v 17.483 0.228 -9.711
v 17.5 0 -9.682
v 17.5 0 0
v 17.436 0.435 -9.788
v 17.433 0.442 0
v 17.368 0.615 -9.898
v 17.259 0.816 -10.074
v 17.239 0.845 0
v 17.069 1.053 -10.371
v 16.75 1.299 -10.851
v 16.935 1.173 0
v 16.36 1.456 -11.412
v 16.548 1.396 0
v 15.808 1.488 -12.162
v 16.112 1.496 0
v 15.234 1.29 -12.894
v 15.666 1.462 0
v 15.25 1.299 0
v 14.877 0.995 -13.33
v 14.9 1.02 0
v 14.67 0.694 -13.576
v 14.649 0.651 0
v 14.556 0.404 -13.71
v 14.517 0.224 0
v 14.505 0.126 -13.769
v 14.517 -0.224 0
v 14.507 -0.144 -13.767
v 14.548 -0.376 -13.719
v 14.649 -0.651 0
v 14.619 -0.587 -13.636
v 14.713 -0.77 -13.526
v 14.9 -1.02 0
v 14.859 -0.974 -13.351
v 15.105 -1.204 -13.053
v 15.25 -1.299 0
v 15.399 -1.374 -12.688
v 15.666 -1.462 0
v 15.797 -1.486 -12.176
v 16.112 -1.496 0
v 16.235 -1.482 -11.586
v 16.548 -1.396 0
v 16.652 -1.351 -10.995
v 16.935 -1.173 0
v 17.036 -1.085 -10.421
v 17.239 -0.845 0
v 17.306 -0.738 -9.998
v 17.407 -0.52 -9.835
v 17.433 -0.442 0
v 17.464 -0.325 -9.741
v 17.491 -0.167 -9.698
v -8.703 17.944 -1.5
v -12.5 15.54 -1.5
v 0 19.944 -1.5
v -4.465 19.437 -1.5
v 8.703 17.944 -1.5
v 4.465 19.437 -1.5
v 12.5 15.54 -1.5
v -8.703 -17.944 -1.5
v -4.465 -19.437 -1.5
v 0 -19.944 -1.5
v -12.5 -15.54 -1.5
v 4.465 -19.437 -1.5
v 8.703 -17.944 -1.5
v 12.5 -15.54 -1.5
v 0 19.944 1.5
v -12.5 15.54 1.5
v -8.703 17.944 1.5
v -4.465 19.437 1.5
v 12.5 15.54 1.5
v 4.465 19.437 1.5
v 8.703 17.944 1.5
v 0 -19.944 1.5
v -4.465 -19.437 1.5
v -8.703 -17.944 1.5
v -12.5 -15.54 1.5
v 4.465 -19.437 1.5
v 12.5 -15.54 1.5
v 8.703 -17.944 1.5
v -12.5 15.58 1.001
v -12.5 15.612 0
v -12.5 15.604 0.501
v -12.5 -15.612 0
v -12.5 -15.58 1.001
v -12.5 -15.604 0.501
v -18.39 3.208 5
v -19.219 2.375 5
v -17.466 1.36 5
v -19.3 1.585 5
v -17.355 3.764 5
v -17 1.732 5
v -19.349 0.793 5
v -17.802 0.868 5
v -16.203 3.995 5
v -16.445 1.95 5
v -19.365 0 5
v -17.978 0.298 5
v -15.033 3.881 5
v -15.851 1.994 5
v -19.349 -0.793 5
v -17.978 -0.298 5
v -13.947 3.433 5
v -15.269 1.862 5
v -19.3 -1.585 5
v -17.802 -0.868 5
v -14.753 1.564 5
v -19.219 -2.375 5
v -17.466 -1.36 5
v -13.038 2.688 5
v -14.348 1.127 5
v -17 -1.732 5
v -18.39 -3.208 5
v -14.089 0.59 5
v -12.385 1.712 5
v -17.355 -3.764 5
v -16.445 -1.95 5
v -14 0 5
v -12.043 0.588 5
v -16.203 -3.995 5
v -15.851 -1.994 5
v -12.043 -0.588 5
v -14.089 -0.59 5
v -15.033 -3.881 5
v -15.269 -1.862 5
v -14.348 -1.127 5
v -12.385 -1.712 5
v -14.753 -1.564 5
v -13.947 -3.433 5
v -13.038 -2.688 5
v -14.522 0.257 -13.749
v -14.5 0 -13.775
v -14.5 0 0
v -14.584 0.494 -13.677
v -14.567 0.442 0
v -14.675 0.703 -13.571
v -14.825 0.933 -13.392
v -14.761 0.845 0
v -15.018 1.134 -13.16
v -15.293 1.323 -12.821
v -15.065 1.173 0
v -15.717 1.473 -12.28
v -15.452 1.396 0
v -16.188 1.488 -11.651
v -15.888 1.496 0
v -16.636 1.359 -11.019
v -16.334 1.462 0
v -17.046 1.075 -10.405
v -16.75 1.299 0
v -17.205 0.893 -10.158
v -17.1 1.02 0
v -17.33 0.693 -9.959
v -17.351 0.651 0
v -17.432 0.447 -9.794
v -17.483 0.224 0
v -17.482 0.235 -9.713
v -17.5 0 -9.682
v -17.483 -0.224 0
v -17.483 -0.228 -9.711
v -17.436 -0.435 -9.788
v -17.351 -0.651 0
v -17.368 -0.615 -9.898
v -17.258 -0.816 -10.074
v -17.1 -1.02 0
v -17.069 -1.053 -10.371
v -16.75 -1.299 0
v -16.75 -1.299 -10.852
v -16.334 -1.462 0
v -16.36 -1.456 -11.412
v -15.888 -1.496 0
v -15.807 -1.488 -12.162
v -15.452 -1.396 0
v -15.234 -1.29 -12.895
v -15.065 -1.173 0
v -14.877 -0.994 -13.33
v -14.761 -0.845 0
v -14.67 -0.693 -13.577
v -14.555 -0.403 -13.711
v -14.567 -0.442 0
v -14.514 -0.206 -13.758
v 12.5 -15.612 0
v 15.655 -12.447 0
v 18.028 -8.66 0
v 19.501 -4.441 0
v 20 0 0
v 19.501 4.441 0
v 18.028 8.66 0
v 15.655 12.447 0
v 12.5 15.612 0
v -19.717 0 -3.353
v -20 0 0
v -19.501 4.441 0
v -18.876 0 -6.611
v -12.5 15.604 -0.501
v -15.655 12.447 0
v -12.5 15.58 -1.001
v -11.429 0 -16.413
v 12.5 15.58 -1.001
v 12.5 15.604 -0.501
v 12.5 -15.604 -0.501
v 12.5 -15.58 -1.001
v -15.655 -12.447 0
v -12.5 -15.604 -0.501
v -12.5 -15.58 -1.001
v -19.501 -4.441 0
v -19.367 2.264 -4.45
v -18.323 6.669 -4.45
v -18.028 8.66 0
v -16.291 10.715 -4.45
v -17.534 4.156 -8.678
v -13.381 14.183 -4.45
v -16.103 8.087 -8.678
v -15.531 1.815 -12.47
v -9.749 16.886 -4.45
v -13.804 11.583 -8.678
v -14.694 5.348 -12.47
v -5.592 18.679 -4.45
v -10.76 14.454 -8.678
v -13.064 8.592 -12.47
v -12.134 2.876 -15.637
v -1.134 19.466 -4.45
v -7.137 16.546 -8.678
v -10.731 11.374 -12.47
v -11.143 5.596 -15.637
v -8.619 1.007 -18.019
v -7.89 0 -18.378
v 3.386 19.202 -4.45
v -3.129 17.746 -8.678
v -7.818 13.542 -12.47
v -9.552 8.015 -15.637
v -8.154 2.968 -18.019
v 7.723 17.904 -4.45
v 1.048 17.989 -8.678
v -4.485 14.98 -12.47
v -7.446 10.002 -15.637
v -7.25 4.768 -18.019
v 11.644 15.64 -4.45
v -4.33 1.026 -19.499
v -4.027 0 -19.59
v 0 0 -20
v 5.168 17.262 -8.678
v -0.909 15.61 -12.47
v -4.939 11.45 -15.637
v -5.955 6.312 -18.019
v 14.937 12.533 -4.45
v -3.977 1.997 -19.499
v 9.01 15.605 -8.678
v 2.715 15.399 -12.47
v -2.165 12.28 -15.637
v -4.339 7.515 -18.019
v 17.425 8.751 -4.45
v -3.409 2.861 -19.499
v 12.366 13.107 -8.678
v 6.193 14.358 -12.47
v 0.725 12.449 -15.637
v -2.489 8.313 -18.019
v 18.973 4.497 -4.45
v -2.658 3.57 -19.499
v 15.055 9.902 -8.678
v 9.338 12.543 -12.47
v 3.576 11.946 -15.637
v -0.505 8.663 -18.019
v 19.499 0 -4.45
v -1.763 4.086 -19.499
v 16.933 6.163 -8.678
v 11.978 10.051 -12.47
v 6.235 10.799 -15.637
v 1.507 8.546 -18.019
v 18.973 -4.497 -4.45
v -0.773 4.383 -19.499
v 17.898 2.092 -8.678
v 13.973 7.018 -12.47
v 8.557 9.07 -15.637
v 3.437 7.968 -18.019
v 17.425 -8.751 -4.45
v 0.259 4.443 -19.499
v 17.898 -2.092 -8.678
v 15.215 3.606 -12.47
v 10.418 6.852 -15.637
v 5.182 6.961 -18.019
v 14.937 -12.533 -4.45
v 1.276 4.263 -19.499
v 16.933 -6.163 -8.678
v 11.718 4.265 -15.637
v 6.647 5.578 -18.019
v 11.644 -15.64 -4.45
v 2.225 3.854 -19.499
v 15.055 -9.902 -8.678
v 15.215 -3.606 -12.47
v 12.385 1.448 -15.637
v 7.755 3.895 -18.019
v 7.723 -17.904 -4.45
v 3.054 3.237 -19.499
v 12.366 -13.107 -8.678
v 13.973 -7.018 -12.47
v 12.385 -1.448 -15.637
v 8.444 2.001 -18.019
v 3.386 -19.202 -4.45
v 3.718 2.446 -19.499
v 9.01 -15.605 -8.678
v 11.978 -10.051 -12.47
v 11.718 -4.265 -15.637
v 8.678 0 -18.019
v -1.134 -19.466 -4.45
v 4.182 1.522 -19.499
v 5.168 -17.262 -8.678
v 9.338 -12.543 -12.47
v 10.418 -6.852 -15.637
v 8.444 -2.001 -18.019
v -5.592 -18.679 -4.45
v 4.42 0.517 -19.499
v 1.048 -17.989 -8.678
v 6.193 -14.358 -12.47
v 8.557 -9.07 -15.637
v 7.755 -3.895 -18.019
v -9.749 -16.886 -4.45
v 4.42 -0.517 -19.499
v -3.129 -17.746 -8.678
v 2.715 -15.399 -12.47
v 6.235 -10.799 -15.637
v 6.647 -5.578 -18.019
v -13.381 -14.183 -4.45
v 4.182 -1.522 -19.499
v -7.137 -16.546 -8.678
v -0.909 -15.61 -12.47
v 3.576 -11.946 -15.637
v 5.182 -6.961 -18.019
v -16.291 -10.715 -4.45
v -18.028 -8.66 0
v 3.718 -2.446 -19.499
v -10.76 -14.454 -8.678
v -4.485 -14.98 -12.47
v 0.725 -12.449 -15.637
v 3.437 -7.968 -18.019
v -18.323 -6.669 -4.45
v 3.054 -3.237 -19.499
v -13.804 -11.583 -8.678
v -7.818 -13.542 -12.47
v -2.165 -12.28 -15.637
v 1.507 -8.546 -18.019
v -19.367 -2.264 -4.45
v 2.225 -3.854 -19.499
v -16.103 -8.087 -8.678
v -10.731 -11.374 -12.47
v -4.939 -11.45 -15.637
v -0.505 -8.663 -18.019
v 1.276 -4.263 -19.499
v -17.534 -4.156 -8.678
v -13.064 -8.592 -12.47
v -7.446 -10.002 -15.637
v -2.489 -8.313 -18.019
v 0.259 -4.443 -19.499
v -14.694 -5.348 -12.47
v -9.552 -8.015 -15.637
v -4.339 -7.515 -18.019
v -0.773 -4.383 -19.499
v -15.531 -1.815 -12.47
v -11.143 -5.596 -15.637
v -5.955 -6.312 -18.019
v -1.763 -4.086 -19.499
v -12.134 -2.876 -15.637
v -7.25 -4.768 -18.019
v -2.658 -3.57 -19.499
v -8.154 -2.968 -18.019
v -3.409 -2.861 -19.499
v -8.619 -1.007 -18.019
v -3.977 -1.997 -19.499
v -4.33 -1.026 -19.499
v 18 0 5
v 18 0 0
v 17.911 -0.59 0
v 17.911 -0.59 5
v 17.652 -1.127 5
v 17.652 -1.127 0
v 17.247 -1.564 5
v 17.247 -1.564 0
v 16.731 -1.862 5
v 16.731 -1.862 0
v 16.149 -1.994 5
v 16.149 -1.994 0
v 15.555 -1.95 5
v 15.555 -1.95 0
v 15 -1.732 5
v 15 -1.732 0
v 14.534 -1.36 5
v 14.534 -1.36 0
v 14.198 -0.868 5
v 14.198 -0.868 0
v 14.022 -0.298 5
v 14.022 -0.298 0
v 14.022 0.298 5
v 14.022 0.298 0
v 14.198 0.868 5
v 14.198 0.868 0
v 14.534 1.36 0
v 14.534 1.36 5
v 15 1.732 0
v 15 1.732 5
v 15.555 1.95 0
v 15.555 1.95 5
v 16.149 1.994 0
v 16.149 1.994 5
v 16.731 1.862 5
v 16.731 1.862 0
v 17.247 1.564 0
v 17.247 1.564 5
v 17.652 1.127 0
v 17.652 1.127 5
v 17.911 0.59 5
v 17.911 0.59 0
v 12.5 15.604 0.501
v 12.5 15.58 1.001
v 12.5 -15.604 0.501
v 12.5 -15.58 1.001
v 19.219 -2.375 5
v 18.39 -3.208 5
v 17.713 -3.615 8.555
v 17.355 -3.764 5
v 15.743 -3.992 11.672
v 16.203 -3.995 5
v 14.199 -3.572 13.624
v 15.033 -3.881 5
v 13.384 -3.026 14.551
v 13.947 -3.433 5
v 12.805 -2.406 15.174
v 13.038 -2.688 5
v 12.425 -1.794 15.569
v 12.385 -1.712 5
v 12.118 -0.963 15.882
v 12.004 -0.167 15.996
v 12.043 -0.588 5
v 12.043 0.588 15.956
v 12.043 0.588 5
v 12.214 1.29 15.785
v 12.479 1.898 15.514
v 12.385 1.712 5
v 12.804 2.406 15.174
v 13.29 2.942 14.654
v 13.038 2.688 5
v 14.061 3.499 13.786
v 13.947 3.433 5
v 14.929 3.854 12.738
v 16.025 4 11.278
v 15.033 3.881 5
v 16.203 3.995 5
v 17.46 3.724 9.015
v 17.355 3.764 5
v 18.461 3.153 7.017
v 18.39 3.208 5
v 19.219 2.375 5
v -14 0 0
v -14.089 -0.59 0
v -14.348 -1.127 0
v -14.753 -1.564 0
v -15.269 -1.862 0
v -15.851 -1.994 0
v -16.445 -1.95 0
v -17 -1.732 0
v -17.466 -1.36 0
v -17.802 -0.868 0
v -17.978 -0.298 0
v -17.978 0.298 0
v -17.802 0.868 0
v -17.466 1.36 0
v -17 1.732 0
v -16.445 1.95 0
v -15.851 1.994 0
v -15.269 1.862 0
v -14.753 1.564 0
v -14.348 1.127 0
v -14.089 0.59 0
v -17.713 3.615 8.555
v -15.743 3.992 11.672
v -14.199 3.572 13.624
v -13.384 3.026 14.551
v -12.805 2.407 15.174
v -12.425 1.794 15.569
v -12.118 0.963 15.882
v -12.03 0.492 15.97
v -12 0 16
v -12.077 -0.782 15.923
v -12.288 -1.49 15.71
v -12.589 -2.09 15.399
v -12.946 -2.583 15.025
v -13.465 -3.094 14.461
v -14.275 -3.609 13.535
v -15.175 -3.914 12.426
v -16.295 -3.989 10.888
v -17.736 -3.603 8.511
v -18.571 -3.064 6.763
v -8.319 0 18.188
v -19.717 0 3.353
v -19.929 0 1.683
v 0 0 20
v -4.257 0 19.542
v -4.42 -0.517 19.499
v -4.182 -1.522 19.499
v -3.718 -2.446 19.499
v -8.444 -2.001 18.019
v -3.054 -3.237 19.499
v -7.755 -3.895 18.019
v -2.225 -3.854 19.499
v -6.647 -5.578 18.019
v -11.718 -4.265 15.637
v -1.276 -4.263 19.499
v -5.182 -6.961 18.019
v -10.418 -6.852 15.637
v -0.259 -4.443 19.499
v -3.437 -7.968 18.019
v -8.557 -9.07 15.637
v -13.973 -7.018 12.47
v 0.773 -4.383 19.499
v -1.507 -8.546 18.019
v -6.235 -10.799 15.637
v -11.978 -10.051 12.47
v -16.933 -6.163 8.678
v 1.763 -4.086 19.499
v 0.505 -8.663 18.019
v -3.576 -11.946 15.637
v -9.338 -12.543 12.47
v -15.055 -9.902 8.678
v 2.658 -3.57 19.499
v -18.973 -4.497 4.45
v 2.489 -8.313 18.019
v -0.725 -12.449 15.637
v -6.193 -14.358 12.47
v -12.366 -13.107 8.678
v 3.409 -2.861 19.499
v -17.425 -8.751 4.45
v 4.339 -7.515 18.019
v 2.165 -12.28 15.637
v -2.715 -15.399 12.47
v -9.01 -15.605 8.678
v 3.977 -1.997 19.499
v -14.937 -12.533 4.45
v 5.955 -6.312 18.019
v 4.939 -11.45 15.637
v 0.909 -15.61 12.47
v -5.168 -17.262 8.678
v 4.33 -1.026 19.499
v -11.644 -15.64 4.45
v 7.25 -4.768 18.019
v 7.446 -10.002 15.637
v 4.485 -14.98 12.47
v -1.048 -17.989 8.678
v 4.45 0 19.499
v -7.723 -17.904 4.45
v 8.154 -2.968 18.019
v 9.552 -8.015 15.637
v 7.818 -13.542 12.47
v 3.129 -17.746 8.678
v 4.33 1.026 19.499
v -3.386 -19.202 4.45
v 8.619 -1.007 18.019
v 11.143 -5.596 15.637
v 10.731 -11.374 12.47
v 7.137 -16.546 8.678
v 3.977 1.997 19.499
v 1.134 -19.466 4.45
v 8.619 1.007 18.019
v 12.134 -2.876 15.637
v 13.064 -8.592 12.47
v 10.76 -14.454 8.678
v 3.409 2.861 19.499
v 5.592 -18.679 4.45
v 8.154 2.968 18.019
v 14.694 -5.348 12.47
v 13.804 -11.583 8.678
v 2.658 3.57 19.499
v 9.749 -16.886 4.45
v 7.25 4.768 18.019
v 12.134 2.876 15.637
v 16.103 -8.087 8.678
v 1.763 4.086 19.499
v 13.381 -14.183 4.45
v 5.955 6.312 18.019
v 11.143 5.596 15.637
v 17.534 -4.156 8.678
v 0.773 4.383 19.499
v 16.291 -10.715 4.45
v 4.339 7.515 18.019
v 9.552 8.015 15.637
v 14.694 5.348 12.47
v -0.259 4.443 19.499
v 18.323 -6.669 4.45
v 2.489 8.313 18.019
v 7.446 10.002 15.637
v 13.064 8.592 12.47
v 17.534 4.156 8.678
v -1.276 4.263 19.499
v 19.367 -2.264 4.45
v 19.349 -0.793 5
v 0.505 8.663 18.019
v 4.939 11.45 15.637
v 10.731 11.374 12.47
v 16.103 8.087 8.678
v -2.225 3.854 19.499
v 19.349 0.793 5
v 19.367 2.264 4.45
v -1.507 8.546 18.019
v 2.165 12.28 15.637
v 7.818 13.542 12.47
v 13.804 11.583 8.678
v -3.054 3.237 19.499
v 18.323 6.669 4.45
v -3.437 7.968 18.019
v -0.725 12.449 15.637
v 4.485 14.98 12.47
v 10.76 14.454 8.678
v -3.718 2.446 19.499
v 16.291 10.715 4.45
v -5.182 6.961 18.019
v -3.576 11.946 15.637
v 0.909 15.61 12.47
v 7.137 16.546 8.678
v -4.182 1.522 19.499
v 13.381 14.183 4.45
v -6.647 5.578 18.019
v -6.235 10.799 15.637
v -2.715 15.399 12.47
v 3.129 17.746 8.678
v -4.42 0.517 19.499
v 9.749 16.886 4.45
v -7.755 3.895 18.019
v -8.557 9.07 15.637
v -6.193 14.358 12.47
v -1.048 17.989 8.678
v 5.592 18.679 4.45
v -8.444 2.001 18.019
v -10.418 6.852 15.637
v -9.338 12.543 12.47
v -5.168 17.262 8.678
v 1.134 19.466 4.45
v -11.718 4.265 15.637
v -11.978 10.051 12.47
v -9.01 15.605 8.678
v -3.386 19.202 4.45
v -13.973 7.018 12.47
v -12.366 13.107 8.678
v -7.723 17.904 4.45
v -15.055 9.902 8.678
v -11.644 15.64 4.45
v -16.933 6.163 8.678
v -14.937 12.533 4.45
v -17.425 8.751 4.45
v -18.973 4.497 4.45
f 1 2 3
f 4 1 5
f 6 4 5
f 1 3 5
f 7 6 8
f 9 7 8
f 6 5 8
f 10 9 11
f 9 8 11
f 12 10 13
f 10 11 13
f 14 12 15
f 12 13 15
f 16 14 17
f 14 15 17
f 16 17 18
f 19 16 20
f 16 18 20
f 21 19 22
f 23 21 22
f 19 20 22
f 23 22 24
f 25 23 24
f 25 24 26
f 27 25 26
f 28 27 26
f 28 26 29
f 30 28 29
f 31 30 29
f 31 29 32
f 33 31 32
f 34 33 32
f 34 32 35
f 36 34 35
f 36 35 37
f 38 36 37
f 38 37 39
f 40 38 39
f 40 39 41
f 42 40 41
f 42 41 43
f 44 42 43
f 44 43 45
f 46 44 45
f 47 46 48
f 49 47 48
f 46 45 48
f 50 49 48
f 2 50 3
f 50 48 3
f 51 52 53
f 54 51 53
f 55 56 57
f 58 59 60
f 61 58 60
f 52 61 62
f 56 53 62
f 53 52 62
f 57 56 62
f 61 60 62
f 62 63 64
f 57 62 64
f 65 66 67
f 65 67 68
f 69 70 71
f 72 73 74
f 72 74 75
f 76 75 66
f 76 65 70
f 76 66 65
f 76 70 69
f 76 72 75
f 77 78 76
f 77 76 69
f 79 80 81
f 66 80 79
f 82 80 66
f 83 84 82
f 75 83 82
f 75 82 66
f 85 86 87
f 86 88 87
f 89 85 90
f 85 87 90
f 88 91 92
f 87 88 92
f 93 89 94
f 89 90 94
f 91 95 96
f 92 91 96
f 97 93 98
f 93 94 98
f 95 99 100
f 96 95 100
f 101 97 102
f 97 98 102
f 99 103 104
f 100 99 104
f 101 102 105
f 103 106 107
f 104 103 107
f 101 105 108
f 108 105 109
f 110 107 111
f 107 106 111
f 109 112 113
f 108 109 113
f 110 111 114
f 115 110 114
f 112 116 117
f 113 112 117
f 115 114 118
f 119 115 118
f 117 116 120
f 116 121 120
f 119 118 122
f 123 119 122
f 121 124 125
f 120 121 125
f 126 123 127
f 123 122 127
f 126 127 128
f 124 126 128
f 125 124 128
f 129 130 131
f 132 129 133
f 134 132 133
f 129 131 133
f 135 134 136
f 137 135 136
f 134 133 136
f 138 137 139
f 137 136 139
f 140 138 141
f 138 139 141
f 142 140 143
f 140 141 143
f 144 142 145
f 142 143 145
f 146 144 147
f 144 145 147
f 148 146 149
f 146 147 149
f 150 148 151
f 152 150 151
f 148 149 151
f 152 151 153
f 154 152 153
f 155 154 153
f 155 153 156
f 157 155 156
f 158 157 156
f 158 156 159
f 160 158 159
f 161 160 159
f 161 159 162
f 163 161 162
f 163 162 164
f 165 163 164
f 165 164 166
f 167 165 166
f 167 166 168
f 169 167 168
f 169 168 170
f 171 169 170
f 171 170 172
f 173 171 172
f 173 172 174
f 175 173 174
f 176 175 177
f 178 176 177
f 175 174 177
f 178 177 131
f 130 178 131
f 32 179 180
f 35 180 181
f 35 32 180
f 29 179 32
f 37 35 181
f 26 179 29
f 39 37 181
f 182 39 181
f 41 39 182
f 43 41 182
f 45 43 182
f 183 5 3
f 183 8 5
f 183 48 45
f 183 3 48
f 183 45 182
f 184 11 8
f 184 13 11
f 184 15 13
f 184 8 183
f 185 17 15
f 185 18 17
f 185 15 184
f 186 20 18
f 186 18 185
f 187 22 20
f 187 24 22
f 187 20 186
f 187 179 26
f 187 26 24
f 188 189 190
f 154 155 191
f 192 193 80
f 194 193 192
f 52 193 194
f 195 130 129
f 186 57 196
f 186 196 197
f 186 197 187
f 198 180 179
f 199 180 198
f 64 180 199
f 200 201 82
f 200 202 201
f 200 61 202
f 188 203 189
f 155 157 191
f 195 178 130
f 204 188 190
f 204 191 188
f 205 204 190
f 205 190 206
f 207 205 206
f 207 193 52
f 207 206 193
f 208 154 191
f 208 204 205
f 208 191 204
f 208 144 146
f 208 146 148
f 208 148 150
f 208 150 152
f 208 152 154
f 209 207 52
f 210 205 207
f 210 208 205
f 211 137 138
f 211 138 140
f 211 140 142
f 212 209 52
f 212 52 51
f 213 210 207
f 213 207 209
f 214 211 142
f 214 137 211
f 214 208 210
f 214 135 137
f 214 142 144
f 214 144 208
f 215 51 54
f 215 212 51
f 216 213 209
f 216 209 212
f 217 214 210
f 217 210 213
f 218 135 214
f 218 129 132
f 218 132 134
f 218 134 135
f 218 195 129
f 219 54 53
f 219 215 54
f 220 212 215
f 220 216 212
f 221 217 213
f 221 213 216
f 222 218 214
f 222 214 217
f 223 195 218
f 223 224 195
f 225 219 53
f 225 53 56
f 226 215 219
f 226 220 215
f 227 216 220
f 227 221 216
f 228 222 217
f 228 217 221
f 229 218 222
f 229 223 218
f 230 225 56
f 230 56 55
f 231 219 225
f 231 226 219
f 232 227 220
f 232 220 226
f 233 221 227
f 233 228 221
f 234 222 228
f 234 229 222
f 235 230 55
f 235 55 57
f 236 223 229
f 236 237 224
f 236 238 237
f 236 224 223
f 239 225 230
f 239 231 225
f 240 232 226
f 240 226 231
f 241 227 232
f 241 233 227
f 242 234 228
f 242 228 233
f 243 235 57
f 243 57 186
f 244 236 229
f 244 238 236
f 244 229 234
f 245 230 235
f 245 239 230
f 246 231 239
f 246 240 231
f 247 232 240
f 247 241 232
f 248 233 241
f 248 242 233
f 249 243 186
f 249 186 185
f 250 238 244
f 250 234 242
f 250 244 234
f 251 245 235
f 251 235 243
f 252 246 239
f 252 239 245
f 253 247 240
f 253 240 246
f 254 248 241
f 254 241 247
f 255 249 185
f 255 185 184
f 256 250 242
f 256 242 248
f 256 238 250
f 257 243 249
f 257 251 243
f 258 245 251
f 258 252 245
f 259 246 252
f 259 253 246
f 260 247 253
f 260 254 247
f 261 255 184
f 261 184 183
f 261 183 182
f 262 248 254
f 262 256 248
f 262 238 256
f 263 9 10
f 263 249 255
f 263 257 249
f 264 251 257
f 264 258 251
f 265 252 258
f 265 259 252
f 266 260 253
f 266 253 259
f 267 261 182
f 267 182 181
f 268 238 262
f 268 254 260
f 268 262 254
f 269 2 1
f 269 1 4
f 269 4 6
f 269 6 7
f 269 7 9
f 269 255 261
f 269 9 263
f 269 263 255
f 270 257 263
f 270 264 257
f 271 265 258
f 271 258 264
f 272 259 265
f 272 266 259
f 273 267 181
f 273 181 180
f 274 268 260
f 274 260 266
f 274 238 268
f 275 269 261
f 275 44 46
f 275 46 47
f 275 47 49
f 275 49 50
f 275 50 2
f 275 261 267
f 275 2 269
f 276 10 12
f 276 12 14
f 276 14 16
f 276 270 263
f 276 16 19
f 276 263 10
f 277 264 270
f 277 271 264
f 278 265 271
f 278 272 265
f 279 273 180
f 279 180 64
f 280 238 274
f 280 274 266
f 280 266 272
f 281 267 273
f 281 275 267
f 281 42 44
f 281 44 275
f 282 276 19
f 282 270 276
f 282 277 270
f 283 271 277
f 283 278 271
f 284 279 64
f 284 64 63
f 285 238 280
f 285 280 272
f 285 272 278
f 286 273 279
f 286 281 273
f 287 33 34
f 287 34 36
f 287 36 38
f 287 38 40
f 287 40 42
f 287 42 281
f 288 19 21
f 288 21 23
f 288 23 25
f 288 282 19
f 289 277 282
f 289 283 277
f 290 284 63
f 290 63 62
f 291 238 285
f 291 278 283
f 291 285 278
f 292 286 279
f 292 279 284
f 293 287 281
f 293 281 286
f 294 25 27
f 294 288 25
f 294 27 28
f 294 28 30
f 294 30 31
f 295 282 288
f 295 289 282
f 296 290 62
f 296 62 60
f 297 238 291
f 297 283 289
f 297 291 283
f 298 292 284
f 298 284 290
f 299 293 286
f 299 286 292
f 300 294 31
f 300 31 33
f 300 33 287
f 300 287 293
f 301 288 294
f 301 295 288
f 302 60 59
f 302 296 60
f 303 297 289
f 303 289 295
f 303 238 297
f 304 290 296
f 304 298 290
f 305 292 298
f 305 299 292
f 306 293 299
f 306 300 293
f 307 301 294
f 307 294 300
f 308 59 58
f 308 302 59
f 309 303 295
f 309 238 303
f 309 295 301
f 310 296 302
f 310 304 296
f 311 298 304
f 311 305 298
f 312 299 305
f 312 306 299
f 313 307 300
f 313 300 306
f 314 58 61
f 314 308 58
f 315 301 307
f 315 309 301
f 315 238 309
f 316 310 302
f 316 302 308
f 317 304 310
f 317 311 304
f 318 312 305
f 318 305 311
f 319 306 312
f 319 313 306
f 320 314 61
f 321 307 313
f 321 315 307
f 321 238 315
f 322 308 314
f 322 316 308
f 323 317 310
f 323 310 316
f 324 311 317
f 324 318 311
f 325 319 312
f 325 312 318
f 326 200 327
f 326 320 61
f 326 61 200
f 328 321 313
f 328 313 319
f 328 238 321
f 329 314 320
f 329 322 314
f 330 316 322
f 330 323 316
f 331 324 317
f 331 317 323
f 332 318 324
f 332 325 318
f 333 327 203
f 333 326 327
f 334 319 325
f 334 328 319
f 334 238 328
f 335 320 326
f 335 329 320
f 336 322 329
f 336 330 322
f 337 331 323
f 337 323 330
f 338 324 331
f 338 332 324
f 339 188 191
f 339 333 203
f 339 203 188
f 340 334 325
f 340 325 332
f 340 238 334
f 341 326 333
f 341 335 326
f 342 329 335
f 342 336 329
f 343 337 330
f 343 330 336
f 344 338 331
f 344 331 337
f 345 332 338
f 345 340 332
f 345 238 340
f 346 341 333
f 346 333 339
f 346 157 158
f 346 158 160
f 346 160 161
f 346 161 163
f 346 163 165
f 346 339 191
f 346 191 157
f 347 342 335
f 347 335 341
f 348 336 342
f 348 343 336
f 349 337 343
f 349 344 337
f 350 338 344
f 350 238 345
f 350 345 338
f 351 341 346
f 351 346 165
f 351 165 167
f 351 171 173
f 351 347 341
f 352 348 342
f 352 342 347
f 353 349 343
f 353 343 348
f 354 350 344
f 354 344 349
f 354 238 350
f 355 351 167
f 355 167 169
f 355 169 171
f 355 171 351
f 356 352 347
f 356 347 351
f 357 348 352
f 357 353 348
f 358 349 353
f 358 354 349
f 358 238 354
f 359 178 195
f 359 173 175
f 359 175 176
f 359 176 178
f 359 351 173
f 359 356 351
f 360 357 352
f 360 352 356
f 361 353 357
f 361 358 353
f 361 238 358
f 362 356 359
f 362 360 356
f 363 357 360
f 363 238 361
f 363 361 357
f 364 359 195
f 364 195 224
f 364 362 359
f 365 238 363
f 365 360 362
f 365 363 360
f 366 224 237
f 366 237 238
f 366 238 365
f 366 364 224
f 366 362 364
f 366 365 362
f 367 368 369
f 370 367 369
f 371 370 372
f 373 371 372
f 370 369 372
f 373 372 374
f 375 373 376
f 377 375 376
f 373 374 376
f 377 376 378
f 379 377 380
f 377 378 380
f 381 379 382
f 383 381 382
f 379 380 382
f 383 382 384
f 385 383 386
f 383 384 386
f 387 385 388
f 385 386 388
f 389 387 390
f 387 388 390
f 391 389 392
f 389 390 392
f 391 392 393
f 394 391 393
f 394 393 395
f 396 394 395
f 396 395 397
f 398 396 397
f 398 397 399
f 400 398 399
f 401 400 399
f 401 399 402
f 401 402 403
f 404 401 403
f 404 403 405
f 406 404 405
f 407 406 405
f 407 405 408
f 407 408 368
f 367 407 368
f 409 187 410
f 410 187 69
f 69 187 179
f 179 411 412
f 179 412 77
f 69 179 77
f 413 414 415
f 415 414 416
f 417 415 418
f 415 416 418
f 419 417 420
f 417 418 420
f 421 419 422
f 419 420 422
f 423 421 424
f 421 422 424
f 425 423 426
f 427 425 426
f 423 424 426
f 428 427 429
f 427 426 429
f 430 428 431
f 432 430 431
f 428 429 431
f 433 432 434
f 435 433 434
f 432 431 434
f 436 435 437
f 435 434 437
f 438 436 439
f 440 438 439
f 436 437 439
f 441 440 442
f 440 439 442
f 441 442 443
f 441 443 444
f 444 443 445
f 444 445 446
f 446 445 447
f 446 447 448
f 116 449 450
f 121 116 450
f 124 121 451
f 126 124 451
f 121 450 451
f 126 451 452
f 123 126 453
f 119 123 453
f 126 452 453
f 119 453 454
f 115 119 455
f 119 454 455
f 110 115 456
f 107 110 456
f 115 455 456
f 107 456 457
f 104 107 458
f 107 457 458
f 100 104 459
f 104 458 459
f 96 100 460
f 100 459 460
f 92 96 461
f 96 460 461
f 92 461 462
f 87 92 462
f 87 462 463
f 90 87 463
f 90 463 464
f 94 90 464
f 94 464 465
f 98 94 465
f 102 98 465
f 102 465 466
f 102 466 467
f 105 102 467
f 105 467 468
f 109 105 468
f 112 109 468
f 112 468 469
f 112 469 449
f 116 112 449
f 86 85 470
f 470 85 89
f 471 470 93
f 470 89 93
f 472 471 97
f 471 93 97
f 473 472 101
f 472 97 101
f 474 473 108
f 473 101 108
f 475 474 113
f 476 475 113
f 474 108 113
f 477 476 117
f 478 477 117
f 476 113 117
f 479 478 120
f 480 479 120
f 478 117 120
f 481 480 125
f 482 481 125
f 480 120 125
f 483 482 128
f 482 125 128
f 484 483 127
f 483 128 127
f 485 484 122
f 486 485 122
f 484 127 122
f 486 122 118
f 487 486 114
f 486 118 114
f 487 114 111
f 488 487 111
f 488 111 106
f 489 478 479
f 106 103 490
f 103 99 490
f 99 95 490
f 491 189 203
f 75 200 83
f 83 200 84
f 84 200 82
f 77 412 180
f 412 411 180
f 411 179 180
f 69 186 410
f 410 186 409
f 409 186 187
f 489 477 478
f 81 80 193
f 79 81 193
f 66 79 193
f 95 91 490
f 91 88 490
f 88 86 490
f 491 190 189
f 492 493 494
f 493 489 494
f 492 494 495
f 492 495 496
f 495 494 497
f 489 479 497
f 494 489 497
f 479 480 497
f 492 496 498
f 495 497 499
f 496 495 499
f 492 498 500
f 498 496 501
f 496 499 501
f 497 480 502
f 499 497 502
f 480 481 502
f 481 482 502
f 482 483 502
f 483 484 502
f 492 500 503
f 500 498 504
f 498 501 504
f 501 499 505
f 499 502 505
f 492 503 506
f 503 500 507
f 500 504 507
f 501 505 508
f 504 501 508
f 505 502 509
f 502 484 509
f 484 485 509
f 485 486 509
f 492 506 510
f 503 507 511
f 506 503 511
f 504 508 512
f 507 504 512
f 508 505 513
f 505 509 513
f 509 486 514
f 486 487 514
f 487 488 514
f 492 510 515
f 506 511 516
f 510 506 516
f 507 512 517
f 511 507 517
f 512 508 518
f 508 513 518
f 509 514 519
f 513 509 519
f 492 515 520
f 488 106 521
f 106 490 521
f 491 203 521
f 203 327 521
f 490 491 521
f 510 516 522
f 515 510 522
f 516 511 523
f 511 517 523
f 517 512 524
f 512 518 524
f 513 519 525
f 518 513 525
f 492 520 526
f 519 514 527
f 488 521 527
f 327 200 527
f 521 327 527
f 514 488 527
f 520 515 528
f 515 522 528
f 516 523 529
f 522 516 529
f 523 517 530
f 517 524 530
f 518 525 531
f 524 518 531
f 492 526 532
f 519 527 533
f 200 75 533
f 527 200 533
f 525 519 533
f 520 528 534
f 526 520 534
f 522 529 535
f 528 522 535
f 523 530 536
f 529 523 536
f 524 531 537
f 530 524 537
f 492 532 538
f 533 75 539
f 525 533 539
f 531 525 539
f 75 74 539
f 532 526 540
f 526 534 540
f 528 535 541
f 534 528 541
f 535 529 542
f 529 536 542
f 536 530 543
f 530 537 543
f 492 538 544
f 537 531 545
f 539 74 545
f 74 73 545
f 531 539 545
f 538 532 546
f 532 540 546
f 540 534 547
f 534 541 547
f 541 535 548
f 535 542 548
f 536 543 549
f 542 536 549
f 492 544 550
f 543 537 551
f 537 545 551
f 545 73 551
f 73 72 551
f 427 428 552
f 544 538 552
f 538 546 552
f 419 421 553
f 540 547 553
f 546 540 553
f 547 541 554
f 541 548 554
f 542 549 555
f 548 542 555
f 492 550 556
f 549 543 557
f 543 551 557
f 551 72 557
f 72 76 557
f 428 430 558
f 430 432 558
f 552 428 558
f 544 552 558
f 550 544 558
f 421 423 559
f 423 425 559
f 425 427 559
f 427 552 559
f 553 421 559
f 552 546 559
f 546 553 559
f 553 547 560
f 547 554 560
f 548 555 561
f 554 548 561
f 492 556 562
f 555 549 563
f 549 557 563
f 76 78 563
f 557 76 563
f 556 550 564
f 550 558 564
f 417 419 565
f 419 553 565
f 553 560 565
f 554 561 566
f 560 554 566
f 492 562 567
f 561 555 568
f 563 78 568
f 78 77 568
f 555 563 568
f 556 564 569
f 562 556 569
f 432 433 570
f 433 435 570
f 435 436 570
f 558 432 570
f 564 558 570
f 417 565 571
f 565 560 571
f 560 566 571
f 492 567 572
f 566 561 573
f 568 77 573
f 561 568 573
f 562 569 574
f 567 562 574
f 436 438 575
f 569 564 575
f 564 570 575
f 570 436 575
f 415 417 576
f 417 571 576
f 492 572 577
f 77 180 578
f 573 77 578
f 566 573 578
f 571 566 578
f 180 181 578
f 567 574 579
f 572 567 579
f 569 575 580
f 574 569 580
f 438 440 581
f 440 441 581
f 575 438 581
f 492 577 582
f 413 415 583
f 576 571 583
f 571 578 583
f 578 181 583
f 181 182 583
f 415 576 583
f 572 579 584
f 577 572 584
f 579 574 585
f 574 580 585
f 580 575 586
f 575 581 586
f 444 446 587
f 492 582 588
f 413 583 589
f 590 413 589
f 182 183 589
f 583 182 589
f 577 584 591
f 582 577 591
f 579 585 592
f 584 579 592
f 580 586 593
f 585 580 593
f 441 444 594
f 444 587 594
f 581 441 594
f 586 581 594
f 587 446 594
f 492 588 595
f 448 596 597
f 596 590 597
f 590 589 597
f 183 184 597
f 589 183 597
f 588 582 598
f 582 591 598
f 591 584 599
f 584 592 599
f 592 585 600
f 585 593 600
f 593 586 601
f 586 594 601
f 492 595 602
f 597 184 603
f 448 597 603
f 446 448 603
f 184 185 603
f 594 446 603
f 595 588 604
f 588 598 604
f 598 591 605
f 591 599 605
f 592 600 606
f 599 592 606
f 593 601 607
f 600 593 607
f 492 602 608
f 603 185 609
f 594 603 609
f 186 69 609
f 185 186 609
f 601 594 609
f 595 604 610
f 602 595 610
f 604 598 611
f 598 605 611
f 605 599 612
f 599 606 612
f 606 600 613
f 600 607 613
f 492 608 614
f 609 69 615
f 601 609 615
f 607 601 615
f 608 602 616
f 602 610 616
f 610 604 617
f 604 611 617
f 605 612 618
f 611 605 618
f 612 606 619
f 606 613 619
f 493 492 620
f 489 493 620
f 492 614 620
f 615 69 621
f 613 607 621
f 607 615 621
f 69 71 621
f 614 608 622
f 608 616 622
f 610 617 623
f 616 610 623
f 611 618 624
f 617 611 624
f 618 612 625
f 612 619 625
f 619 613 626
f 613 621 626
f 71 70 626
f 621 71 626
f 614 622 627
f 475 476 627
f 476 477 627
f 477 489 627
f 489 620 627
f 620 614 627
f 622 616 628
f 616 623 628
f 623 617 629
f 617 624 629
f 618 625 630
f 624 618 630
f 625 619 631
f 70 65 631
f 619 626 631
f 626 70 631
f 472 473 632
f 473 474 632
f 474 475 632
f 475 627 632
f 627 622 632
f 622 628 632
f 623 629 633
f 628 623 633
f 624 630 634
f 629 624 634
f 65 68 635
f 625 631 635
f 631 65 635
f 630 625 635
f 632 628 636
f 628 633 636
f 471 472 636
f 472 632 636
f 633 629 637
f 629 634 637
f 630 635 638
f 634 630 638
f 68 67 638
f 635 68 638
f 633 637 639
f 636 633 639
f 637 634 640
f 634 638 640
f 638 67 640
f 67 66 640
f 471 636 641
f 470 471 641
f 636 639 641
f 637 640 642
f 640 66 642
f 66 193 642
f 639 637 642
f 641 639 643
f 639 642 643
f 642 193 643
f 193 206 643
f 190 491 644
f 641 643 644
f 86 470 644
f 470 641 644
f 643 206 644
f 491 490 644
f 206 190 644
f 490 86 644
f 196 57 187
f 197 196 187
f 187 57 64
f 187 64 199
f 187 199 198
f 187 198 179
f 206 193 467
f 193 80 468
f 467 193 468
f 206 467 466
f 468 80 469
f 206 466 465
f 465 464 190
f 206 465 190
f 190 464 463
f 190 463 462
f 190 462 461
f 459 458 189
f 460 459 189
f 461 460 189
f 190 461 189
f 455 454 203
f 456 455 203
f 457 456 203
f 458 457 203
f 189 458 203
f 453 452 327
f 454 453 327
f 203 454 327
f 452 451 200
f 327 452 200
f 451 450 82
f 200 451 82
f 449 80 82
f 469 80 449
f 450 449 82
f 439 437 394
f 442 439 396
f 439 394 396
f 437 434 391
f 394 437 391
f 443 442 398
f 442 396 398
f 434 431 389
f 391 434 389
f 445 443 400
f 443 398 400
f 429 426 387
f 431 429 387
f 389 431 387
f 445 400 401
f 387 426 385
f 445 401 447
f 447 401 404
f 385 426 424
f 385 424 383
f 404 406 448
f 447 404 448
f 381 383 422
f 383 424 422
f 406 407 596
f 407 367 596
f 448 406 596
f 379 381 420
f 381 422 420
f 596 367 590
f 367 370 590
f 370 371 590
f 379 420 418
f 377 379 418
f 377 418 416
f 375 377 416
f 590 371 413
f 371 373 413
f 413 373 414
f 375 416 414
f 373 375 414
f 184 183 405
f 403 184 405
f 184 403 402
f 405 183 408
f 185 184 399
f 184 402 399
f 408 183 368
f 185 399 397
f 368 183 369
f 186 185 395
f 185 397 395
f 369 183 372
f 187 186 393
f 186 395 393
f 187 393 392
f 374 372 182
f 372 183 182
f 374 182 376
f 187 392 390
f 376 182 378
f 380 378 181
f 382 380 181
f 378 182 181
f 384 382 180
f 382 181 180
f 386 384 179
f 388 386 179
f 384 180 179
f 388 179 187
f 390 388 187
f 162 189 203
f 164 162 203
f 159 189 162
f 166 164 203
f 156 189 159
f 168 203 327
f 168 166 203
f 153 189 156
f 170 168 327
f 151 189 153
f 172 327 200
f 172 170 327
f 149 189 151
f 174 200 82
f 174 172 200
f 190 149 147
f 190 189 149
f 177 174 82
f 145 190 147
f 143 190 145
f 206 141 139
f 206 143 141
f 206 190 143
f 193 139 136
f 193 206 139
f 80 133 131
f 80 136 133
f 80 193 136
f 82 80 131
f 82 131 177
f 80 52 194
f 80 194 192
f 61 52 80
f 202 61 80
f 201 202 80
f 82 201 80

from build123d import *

# Parameters (mm, degrees)
F2_W      = 25
F2_H      = 3
F3_DEPTH  = 25
F4_R      = 2
F5_DEPTH  = 20.001
F7_R      = 4
F8_DEPTH  = 15.001
F11_W     = 25
F11_H     = 3
F12_DEPTH = 25
F13_R     = 1.5
F14_DEPTH = 20.001


with BuildPart() as f1:
    # F0 (on Front) → F1 (revolve)
    with BuildSketch(Plane.XZ):
        with BuildLine():
            Line((0, 0), (0, 20))
            ThreePointArc((0, 20), (-14.1421356237, 14.1421356237), (-20, 0))
            Line((-20, 0), (0, 0))
        make_face()
    revolve(axis=Axis((0, 0, 10), (0, 0, 1)))

    # F2 (on Front) → F3 (cut, symmetric)
    with BuildSketch(Plane.XZ):
        Rectangle(F2_W, F2_H)
    extrude(amount=F3_DEPTH, both=True, mode=Mode.SUBTRACT)

    # F4 (on face) → F5 (cut, through all)
    with BuildSketch(Plane(origin=(0, 0, 0), x_dir=(1, 0, 0), z_dir=(0, 0, -1))):
        with Locations((-16, 0)):
            Circle(F4_R)
        with Locations((16, 0)):
            Circle(F4_R)
    extrude(amount=-F5_DEPTH, mode=Mode.SUBTRACT)

    # F7 (on offset) → F8 (cut, through all)
    with BuildSketch(Plane(origin=(0, 0, 5), x_dir=(1, 0, 0), z_dir=(0, 0, -1))):
        with Locations((-16, 0)):
            Circle(F7_R)
        with Locations((16, 0)):
            Circle(F7_R)
    extrude(amount=-F8_DEPTH, mode=Mode.SUBTRACT)


with BuildPart() as f10:
    # F9 (on Front) → F10 (revolve)
    with BuildSketch(Plane.XZ):
        with BuildLine():
            Line((0, 0), (-20, 0))
            ThreePointArc((-20, 0), (-14.1421356237, -14.1421356237), (0, -20))
            Line((0, -20), (0, 0))
        make_face()
    revolve(axis=Axis((0, 0, -10), (0, 0, -1)))

    # F11 (on Front) → F12 (cut, symmetric)
    with BuildSketch(Plane.XZ):
        Rectangle(F11_W, F11_H)
    extrude(amount=F12_DEPTH, both=True, mode=Mode.SUBTRACT)

    # F13 (on Top) → F14 (cut, through all)
    with BuildSketch(Plane.XY):
        with Locations((-16, 0)):
            Circle(F13_R)
        with Locations((16, 0)):
            Circle(F13_R)
    extrude(amount=-F14_DEPTH, mode=Mode.SUBTRACT)


solid = Compound([f1.part, f10.part])
